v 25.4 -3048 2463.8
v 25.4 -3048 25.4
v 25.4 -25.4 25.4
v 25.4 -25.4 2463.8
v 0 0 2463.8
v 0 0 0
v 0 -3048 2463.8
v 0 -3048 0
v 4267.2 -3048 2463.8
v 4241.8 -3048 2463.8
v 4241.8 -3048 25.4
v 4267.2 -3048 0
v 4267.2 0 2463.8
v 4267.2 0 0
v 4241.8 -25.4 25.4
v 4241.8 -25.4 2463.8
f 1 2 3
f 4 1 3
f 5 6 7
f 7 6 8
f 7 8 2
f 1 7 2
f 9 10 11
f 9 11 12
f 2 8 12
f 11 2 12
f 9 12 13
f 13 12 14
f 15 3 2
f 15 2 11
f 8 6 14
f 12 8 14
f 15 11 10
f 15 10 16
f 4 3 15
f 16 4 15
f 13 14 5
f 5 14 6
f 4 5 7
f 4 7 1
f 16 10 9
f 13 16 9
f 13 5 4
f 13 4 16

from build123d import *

# Parameters (mm, degrees)
F0_W     = 4267.2
F0_H     = 3048
F1_DEPTH = 25.4
F3_W     = 25.4
F3_H     = 3022.6
F4_DEPTH = 2438.4


with BuildPart() as f1:
    # F0 (on Top) → F1 (new body)
    with BuildSketch(Plane.XY):
        with Locations((2133.6, -1524)):
            Rectangle(F0_W, F0_H)
    extrude(amount=F1_DEPTH)

    # F3 (on face) → F4 (join)
    with BuildSketch(Plane.XY.offset(25.4)):
        Polygon((4267.2, 0), (0, 0), (0, -25.4), (25.4, -25.4), (4241.8, -25.4), (4267.2, -25.4), align=None)
        with Locations((12.7, -1536.7)):
            Rectangle(F3_W, F3_H)
        with Locations((4254.5, -1536.7)):
            Rectangle(F3_W, F3_H)
    extrude(amount=F4_DEPTH)


solid = f1.part
